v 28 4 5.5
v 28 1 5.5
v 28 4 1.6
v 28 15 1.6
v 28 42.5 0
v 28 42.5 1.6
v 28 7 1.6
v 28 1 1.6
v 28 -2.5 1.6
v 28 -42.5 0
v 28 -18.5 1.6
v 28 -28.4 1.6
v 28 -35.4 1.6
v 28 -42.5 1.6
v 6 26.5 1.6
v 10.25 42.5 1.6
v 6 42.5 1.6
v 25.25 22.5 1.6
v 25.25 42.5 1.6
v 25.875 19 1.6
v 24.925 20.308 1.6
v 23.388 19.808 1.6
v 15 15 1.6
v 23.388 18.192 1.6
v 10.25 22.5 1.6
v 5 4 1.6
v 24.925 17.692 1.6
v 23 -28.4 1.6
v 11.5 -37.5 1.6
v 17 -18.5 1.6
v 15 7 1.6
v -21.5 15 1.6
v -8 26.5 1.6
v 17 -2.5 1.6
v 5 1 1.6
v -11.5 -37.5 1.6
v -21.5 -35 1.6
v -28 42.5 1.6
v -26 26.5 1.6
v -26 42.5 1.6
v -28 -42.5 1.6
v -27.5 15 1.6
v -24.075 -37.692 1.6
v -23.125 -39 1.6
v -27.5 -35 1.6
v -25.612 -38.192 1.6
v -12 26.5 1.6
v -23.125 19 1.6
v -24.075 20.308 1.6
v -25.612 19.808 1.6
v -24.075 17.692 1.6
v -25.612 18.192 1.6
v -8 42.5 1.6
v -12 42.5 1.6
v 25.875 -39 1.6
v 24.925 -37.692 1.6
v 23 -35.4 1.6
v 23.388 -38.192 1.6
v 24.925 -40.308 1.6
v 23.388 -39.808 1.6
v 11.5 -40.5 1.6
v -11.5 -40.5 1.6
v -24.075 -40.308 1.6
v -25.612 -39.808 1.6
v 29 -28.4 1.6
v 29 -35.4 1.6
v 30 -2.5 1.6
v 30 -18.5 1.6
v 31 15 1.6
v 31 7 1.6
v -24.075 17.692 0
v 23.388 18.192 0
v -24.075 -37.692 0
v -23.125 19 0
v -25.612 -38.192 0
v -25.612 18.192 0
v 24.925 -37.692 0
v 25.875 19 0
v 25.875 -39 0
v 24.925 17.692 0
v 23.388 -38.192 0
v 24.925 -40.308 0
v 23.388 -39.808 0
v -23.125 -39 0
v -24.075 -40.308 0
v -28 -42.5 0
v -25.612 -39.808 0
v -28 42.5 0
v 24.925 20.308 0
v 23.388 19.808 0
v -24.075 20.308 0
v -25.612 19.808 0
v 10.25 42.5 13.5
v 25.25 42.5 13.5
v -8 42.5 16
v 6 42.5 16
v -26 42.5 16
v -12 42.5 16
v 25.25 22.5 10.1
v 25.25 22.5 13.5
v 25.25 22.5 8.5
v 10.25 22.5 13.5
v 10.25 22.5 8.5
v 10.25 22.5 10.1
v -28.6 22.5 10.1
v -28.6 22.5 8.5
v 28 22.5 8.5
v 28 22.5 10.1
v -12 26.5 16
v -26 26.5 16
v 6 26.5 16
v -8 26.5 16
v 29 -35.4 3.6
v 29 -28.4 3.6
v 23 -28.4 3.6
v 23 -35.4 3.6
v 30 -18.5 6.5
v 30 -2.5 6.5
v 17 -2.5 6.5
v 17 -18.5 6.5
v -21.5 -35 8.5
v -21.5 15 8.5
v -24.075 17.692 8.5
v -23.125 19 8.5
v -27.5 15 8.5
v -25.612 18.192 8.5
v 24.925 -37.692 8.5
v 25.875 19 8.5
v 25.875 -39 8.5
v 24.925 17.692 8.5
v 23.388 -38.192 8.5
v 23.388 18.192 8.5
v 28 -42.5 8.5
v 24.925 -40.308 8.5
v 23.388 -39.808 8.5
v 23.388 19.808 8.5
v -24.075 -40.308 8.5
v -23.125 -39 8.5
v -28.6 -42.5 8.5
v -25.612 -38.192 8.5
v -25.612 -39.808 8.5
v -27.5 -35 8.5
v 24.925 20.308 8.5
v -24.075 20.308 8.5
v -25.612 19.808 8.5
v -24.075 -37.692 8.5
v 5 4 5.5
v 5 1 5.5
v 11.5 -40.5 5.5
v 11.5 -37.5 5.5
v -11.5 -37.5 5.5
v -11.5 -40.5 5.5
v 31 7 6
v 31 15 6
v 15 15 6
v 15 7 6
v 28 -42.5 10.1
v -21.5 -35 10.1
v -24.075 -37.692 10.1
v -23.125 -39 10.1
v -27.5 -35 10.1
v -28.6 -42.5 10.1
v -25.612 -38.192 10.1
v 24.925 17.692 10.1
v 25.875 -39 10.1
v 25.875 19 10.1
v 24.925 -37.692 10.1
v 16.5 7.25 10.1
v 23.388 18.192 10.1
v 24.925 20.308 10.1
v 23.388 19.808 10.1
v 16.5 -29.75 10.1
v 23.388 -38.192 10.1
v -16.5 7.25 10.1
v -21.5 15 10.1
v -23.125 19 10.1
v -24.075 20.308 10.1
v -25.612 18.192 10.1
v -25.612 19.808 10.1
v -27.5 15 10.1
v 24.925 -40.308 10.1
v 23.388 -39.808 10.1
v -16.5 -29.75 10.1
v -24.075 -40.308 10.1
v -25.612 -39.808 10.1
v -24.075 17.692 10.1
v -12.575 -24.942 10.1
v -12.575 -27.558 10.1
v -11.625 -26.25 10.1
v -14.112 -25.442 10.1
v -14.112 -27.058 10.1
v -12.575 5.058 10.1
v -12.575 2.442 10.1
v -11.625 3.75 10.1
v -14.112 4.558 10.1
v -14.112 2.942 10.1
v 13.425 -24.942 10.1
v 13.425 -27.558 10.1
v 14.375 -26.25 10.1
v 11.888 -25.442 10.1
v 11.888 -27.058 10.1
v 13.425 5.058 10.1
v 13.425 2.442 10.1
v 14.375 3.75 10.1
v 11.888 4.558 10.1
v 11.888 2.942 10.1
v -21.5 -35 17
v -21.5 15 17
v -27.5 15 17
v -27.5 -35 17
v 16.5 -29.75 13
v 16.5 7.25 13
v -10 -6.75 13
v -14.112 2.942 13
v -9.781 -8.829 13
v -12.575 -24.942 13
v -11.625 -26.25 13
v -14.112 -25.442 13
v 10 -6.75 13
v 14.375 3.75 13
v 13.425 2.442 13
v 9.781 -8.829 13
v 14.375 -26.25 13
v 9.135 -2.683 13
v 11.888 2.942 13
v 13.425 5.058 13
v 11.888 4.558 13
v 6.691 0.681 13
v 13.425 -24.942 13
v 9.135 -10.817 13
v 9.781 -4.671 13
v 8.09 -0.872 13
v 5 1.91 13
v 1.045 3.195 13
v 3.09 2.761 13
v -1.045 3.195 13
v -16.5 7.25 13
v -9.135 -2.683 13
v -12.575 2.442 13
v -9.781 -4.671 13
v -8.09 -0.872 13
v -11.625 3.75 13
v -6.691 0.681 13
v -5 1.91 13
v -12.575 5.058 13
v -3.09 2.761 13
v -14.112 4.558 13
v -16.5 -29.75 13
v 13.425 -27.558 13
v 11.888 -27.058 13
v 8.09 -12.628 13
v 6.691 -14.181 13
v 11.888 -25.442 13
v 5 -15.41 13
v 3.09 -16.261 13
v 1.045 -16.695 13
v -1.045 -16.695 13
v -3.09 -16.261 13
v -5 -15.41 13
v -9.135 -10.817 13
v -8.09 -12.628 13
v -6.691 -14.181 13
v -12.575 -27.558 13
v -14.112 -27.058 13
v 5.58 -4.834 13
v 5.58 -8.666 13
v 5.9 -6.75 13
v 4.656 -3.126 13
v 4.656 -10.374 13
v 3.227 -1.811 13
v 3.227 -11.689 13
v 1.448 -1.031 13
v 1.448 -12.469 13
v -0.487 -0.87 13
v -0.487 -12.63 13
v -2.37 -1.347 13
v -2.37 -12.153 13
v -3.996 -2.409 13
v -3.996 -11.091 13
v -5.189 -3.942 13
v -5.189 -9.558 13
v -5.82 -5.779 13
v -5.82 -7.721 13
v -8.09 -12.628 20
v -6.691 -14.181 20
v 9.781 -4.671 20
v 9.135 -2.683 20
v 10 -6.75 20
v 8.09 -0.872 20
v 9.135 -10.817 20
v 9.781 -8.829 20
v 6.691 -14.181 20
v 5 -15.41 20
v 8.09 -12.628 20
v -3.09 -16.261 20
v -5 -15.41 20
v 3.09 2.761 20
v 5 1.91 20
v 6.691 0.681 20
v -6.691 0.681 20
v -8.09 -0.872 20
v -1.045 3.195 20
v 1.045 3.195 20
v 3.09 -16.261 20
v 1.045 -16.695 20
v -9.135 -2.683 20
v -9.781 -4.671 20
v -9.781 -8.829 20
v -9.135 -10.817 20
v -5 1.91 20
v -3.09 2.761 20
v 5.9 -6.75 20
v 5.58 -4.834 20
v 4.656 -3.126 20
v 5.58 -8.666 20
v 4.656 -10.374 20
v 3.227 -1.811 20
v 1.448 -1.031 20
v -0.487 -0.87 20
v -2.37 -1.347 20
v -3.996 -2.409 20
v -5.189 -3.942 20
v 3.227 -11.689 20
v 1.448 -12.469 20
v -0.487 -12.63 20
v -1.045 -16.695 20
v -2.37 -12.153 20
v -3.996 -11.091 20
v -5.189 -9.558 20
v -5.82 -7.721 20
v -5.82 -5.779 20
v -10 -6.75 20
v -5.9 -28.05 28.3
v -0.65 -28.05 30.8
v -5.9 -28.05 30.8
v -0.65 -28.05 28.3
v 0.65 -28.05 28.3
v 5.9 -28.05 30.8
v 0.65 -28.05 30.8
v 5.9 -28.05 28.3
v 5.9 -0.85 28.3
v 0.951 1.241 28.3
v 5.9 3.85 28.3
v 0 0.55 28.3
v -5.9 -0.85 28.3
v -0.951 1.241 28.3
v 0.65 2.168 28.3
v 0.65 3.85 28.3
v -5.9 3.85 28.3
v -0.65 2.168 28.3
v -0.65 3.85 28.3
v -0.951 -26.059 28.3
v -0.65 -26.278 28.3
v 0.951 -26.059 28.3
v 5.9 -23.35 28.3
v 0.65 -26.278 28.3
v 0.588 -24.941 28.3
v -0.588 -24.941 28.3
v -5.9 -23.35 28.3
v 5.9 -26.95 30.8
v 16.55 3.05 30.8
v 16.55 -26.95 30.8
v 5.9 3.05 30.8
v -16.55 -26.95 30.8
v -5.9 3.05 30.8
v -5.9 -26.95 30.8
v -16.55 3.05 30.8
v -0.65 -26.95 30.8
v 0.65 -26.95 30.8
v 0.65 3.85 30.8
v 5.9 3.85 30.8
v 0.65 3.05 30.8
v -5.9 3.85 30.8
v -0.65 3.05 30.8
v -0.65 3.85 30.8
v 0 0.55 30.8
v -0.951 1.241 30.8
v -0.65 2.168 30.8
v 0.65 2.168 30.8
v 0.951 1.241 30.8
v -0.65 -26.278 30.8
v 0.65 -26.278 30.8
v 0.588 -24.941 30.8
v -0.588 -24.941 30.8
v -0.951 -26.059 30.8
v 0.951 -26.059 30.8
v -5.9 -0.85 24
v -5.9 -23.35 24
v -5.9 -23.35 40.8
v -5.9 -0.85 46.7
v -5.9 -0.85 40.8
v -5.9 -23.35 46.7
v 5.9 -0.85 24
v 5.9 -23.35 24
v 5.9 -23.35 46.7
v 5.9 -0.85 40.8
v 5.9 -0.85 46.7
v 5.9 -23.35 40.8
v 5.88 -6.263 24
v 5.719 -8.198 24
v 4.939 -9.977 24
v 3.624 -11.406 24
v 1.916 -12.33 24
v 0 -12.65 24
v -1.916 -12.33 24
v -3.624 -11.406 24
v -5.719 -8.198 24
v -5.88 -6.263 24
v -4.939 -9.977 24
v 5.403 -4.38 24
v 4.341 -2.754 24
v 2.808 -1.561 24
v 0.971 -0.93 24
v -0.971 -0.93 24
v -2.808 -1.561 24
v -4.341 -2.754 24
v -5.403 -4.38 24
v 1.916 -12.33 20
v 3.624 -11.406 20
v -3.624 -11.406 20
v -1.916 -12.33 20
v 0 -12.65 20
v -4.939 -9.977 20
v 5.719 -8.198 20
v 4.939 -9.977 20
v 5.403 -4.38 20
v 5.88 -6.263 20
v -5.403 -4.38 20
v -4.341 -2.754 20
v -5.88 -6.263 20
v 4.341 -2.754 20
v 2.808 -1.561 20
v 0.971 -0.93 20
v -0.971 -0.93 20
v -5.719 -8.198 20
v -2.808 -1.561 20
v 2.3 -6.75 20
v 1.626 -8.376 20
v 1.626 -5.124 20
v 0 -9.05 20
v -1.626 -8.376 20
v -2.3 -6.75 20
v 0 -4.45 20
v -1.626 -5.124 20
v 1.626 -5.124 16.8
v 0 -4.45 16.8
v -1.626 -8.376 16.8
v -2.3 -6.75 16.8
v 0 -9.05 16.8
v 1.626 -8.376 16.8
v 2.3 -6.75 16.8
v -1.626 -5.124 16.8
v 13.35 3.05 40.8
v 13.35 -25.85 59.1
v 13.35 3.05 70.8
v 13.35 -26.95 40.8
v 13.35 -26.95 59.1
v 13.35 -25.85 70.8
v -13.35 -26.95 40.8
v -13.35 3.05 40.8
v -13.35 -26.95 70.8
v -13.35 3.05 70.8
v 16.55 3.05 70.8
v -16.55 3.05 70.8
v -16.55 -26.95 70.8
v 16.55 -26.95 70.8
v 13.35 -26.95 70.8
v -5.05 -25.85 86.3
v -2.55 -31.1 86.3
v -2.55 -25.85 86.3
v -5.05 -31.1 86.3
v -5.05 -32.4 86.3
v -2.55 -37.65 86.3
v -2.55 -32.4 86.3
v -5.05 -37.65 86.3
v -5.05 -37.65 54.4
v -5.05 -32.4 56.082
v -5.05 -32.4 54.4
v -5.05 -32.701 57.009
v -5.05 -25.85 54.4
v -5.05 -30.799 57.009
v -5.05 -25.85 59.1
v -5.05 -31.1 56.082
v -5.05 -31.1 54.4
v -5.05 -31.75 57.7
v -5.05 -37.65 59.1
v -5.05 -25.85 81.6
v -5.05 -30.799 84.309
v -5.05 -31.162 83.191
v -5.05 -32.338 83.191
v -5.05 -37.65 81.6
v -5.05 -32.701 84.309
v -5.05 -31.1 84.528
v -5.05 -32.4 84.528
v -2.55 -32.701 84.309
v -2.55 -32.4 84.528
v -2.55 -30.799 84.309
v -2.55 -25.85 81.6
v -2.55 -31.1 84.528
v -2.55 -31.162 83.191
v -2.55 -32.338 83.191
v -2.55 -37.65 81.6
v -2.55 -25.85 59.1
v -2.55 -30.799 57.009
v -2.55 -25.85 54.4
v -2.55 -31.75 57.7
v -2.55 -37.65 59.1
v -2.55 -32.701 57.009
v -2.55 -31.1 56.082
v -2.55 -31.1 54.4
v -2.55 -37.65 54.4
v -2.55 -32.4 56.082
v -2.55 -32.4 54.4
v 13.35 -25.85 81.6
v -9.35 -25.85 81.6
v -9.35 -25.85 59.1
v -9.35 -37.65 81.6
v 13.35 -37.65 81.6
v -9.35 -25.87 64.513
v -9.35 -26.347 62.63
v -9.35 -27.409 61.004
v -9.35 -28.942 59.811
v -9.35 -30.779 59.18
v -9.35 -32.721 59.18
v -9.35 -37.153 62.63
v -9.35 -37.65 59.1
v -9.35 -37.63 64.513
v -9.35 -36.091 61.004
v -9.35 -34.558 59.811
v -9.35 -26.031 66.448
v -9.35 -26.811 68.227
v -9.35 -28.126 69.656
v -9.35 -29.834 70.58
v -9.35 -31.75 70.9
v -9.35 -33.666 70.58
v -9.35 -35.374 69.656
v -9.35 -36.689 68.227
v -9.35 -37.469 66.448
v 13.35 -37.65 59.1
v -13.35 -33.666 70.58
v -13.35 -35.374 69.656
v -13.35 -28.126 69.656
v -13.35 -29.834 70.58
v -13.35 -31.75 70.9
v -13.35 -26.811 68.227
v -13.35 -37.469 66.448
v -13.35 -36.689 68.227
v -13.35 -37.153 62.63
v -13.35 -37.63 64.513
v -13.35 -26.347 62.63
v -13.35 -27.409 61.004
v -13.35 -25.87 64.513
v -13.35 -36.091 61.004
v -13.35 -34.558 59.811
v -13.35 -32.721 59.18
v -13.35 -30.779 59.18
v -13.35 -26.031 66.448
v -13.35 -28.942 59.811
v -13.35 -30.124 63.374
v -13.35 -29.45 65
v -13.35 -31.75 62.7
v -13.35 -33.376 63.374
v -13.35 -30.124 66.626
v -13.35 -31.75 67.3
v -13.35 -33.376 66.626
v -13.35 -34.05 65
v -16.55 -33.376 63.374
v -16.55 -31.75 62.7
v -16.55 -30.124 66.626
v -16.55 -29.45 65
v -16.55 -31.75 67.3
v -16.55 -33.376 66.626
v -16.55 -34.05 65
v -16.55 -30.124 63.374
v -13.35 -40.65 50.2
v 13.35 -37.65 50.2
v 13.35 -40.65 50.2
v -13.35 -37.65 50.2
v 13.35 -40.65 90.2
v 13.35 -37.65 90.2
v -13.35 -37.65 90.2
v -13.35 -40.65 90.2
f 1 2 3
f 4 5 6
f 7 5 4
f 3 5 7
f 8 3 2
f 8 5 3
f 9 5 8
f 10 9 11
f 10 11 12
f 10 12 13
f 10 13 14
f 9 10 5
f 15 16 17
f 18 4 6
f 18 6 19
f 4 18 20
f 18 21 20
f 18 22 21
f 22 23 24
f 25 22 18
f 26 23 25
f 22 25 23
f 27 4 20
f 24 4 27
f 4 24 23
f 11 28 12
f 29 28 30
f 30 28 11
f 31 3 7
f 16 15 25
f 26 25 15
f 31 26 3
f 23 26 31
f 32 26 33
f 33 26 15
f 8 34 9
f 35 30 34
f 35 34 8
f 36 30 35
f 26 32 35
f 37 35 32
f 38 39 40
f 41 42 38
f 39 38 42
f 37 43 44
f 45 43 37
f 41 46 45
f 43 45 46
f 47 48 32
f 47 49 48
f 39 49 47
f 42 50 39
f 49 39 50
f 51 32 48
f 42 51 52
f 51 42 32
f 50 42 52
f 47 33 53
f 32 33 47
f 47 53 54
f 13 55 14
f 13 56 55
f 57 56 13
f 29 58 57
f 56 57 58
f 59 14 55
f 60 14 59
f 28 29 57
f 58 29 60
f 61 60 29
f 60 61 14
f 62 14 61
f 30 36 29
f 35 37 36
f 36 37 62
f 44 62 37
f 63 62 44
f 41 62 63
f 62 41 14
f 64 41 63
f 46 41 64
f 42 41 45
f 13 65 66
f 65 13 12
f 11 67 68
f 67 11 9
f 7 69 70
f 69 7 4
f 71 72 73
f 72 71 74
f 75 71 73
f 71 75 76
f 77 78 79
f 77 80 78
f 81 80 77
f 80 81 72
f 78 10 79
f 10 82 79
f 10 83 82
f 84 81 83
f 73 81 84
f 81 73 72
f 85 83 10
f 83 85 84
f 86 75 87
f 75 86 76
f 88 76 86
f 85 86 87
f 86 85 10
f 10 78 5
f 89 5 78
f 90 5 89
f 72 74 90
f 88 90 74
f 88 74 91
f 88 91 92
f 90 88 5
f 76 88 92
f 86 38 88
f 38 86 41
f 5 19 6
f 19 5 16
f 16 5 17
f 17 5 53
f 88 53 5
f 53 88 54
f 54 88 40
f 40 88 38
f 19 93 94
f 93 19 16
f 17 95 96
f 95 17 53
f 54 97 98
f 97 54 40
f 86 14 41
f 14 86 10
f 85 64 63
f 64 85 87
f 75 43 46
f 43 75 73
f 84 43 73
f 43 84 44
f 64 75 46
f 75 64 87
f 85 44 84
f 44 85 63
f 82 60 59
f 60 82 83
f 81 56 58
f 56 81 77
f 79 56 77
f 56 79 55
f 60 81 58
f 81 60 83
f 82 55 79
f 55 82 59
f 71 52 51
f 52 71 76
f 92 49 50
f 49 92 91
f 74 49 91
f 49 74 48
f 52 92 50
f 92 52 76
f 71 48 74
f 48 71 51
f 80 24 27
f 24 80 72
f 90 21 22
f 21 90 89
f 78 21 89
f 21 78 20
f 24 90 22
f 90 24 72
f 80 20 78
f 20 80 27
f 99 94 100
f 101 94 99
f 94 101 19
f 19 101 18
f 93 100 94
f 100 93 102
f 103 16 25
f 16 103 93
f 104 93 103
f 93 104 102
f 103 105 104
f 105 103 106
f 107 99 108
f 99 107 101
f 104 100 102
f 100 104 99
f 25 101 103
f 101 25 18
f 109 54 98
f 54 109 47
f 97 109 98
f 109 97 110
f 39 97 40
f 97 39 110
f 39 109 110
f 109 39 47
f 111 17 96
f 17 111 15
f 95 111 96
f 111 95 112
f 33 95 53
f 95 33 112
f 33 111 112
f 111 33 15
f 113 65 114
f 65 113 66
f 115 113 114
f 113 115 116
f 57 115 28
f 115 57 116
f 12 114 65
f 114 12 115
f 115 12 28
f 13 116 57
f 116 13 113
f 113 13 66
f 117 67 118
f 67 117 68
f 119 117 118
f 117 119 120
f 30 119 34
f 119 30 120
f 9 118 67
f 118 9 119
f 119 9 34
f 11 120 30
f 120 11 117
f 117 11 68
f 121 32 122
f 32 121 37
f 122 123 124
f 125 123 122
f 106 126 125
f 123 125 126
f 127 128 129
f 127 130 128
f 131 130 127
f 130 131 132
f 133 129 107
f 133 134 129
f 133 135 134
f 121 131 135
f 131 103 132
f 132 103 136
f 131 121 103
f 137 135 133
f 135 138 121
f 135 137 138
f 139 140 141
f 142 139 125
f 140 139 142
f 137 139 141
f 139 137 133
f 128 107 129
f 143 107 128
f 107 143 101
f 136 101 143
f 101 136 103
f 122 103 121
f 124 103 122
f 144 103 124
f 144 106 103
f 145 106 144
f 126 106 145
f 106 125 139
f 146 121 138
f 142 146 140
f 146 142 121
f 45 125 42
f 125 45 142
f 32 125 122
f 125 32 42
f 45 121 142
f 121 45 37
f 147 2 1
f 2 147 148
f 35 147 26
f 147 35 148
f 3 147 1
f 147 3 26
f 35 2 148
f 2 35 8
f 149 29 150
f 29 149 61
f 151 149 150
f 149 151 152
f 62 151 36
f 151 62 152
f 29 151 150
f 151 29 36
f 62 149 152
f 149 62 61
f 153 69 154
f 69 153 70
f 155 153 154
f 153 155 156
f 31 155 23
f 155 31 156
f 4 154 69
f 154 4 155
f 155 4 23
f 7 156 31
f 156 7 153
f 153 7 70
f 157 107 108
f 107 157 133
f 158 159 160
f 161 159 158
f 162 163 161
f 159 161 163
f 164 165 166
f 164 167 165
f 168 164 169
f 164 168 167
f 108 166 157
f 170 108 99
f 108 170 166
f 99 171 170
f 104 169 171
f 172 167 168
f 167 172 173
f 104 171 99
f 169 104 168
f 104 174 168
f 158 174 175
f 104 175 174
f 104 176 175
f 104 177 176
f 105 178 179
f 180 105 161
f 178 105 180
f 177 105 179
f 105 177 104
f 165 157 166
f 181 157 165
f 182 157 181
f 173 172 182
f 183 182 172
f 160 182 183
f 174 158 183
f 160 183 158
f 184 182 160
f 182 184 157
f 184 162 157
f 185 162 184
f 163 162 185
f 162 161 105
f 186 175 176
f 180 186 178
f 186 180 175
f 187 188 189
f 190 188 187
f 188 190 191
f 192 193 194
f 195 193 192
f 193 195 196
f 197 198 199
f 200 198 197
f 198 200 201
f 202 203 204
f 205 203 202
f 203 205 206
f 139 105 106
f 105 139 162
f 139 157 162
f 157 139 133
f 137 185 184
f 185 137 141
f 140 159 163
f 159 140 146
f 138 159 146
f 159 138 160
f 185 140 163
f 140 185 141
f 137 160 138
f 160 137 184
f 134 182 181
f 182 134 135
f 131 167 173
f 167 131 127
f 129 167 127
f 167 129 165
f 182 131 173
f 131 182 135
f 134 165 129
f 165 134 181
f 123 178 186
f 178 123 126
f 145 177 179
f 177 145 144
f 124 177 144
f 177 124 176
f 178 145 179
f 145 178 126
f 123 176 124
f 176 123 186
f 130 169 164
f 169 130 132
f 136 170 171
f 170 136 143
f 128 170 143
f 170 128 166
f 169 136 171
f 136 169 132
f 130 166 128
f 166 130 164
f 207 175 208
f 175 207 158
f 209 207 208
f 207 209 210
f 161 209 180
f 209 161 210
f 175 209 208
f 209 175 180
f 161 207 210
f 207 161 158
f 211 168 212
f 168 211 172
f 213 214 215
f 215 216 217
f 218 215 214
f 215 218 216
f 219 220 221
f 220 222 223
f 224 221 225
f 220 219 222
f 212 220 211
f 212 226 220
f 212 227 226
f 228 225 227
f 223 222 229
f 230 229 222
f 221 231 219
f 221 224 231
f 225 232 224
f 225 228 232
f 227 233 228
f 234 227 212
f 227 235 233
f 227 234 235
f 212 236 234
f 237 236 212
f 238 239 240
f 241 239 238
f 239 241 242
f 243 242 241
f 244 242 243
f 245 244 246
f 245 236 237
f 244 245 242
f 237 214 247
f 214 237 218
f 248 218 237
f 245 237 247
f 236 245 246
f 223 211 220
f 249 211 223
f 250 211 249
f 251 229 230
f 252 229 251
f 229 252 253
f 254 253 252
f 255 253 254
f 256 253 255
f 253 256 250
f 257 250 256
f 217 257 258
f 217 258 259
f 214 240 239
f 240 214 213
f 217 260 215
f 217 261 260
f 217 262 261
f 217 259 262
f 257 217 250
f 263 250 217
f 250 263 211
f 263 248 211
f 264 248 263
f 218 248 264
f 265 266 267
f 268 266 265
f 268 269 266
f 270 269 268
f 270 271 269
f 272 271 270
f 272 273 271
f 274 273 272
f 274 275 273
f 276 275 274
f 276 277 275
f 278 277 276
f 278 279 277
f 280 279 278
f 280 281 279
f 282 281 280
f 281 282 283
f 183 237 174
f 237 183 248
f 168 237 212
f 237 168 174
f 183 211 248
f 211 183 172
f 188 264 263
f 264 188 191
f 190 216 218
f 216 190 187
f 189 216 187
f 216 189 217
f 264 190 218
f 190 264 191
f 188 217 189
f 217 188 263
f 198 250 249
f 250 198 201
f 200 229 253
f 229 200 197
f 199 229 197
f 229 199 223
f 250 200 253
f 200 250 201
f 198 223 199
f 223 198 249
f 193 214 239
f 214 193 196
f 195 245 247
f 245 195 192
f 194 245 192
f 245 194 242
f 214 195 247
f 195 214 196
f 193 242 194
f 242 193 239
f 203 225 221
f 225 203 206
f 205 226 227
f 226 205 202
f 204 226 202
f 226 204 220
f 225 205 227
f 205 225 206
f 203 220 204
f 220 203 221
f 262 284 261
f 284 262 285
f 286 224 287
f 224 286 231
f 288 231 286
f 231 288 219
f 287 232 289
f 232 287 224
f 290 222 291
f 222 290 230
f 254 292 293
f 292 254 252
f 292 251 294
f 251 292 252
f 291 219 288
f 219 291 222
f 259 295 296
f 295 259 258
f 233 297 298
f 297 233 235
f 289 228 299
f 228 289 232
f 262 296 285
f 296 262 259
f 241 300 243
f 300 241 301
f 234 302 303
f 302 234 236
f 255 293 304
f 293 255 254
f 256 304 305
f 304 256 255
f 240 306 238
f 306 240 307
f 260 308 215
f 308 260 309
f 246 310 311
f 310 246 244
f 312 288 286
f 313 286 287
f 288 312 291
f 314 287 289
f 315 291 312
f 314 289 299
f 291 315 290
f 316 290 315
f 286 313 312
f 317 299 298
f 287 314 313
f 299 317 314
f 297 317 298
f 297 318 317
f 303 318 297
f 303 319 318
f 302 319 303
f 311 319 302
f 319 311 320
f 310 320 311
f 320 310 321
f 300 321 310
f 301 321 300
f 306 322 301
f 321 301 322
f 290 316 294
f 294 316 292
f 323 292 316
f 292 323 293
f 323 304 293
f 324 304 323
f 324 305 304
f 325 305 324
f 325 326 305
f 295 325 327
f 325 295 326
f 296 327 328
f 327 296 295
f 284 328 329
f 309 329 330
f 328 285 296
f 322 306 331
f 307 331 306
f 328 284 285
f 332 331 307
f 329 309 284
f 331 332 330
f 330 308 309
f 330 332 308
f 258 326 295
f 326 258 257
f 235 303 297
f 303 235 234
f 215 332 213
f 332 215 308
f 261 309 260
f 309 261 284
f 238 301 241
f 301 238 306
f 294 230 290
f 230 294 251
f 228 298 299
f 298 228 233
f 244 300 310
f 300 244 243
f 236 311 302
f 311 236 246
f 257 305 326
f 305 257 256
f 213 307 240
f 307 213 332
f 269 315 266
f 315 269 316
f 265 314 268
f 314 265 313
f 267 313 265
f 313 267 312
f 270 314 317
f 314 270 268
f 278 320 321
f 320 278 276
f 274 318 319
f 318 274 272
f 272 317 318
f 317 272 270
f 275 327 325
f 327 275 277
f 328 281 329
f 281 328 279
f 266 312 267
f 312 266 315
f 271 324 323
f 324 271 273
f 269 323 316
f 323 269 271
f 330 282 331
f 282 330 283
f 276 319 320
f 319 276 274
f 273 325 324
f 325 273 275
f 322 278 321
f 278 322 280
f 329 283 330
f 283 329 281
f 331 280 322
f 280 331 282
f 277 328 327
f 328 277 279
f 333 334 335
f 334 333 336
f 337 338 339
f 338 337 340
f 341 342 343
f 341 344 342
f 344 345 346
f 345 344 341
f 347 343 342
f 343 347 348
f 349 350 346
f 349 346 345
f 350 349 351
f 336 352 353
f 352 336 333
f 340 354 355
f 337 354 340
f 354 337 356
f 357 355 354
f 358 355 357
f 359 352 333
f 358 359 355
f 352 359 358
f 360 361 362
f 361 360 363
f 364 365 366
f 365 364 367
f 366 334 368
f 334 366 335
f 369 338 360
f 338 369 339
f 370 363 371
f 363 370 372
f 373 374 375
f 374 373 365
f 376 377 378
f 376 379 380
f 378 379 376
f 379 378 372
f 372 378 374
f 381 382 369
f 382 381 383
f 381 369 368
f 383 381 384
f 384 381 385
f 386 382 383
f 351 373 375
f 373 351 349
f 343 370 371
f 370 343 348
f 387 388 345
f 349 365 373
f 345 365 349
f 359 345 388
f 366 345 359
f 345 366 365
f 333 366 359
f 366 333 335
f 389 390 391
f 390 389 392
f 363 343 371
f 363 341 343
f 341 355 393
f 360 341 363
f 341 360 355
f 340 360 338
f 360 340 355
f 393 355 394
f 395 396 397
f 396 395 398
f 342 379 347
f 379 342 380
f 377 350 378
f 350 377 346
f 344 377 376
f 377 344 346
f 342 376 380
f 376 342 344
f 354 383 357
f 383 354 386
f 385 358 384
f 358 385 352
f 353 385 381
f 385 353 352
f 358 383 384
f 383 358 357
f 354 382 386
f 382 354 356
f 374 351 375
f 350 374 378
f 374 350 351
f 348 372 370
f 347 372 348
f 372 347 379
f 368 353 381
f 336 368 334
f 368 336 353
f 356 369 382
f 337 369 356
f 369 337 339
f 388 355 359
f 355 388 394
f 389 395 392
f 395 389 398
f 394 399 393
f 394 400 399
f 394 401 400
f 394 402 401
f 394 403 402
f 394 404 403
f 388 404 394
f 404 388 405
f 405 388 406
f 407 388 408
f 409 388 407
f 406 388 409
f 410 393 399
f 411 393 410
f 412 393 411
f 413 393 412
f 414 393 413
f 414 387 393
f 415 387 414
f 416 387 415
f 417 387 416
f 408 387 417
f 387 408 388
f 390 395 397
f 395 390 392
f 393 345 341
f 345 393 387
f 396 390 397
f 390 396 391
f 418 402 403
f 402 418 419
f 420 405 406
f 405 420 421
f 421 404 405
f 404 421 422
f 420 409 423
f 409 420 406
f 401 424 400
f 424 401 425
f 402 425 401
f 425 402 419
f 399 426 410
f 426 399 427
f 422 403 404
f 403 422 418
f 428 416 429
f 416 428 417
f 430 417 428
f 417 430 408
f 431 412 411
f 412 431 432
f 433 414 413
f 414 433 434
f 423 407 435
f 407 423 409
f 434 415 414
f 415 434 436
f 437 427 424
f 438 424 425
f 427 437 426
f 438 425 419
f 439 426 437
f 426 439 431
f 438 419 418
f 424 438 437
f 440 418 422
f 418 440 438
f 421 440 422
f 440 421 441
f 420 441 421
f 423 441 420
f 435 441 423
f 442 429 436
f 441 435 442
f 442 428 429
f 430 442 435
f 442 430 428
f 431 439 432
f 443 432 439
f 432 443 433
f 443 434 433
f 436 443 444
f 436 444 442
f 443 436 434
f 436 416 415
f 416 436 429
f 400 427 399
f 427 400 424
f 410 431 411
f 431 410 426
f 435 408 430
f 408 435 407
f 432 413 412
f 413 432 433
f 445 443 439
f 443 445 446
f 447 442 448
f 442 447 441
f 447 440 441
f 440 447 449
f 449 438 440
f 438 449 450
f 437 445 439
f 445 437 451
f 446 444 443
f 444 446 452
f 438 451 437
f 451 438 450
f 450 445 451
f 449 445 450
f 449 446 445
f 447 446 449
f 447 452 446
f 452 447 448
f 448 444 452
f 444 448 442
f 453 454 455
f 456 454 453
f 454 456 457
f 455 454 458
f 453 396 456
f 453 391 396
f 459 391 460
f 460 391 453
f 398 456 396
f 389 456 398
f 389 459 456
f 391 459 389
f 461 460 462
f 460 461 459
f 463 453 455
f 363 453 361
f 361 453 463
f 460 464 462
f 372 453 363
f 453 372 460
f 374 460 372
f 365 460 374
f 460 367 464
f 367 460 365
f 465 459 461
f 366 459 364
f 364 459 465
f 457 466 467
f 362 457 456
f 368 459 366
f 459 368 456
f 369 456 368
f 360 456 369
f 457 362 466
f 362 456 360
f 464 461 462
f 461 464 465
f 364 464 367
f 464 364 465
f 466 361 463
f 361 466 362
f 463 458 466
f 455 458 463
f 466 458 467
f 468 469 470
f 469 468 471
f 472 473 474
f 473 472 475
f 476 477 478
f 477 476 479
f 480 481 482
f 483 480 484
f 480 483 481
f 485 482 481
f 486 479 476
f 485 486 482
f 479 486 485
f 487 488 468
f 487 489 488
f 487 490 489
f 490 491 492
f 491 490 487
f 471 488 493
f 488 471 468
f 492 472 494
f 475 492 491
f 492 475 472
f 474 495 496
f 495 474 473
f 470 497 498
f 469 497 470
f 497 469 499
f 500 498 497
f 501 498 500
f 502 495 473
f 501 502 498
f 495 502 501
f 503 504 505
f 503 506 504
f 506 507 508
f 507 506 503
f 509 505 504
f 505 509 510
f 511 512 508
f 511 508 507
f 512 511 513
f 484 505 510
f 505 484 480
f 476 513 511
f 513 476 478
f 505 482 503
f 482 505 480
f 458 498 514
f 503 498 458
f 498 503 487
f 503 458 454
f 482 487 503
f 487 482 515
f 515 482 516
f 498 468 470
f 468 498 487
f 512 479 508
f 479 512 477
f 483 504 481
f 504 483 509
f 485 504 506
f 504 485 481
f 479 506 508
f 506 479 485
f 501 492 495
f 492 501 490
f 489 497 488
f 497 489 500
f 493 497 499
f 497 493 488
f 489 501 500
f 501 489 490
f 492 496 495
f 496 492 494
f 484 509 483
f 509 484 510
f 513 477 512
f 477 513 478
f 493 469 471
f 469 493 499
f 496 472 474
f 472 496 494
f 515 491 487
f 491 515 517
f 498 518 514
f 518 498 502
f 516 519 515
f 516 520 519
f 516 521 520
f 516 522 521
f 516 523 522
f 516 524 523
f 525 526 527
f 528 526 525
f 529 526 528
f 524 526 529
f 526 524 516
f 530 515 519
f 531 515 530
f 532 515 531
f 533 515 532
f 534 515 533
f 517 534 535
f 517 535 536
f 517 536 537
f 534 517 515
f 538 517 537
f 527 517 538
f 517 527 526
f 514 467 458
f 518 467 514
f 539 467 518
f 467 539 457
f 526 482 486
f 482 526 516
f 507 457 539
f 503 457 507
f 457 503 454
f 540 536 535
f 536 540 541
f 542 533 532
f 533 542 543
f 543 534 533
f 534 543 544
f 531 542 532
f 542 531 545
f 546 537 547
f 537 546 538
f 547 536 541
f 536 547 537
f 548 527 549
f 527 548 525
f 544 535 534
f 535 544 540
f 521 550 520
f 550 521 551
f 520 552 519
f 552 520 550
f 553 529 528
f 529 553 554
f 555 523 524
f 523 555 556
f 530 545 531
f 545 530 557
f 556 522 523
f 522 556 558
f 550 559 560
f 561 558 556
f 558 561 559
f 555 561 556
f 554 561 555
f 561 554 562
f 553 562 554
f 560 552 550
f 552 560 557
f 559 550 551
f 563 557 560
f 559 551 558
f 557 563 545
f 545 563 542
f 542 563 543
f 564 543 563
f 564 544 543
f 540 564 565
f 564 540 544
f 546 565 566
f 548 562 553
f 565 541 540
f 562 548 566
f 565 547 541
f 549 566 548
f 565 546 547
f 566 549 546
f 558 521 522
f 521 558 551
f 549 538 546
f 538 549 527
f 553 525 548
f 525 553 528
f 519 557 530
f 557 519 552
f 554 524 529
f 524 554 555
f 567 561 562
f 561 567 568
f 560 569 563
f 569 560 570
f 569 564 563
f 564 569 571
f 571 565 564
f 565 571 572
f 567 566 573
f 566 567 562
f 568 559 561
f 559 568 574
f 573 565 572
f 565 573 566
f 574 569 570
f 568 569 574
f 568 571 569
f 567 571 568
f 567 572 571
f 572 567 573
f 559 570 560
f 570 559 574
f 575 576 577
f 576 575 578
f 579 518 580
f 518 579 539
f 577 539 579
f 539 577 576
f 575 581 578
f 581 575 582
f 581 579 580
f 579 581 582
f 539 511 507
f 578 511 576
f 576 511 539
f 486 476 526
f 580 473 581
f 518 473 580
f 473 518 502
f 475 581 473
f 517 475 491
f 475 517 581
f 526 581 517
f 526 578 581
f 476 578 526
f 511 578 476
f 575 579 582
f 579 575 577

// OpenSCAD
// file: servo_sg90.scad
servo_sg90();

module servo_sg90()
{
    width = 22.5;
    length = 11.8;
    height = 22.7;
    
    mounting_width = width + (2 * 4.7);
    mounting_length = length;
    mounting_height = 2.5;
    mounting_width_offset = -4.7;
    mounting_height_offset = 18.4 - mounting_height;
    
    mounting_hole_diameter = 2;
    mounting_hole_width_offset = 2.3;
    mounting_hole_length_offset = 5.9;
    
    mounting_notch_width = mounting_hole_width_offset;
    mounting_notch_length = 1.3;
    mounting_notch_width_offset = mounting_notch_width / 2;
    
    mount_point_height = 4;
    mount_point_diameter = 11.8;
    mount_point_width_offset = 5.9;
    mount_point_length_offset = length / 2;
    mount_point_height_offset = height;
    
    gear_height = 3.2;
    gear_diameter = 4.6;
    gear_width_offset = mount_point_width_offset;
    gear_length_offset = mount_point_length_offset;
    gear_height_offset = mount_point_height_offset + mount_point_height;
    
    rotate([0, 180, 0])
    translate([-(gear_width_offset), -(gear_length_offset), -(height + mount_point_height)])
    union()
    {
        color("blue", 1.0)
        cube([width, length, height], false);
        
        color("blue", 1.0)
        translate([mounting_width_offset, 0, mounting_height_offset])
        difference()
        {
            cube([mounting_width, mounting_length, mounting_height], false);
            
            translate([mounting_hole_width_offset, mounting_hole_length_offset, 0])
            cylinder(height, d = mounting_hole_diameter);
            
            translate([mounting_width - mounting_hole_width_offset, mounting_hole_length_offset, 0])
            cylinder(height, d = mounting_hole_diameter);
            
            translate([mounting_notch_width_offset, mounting_hole_length_offset, 0])
            cube([mounting_notch_width, mounting_notch_length, height], true);

            translate([mounting_width - mounting_notch_width_offset, mounting_hole_length_offset, 0])
            cube([mounting_notch_width, mounting_notch_length, height], true);
        }
        
        color("blue", 1.0)
        translate([mount_point_width_offset, mount_point_length_offset, mount_point_height_offset])
        cylinder(mount_point_height, d = mount_point_diameter);
        
        color("white", 1.0)
        translate([gear_width_offset, gear_length_offset, gear_height_offset])
        cylinder(gear_height, d = gear_diameter);
    }
}
// file: raspberry_pi_pan_tilt.scad
use <servo_sg90.scad>

raspberry_pi_pan_tilt_base__base_height = 3;
raspberry_pi_pan_tilt_base__bottom_servo_mount_height = 7;

raspberry_pi_pan_tilt(6.5, 0, 0);

module raspberry_pi_pan_tilt(bottom_mount_offset, pan_angle, tilt_angle)
{
    bottom_servo_height_offset = 10;
    
    bottom_servo_housing_width = 26.7;
    bottom_servo_housing_length = 30;
    bottom_servo_housing_height = 10;
    bottom_servo_housing_mount_height = 40;
    bottom_servo_housing_length_offset = -5.2;
    bottom_servo_housing_height_offset = bottom_servo_height_offset + 10.8;
    
    top_servo_width_offset = -(26.7 / 2);//-15;
    top_servo_length_offset = -25;
    top_servo_height_offset = 55;

    top_servo_housing_width = 40;
    top_servo_housing_length = 3;
    top_servo_housing_height = 26.7;
    top_servo_housing_width_offset = -5.2;
    top_servo_housing_length_offset = -5.9 - (top_servo_housing_length / 2);
    top_servo_housing_height_offset = 0;
    
    raspberry_pi_pan_tilt_base(bottom_mount_offset);

    rotate([0, 0, pan_angle])
    union()
    {
        rotate([0, 0, 90])
        translate([0, 0, bottom_servo_height_offset])
        servo_sg90();
        
        translate([0, bottom_servo_housing_length_offset, bottom_servo_housing_height_offset])
        raspberry_pi_pan_tilt_bottom_servo_housing(bottom_servo_housing_width, bottom_servo_housing_length, bottom_servo_housing_height, bottom_servo_housing_mount_height);

        rotate([90, 90, 90])
        translate([-top_servo_height_offset, top_servo_length_offset, top_servo_width_offset])
        rotate([0, 0, tilt_angle])
        union()
        {
            servo_sg90();
            
            translate([top_servo_housing_width_offset, top_servo_housing_length_offset, top_servo_housing_height_offset])
            raspberry_pi_pan_tilt_top_servo_housing(top_servo_housing_width, top_servo_housing_length, top_servo_housing_height);
        }
    }
}

module raspberry_pi_pan_tilt_base(bottom_mount_offset)
{
    base_width = 33;
    base_length = 37;
    base_height = 3;
    
    mounting_hole_width = 26;
    mounting_hole_length = 30;
    
    mounting_hole_diameter = 2.75;
    mounting_hole_width_offset = (base_width - mounting_hole_width) / 2;
    mounting_hole_length_offset = (base_length - mounting_hole_length) / 2;
    
    bottom_servo_mount_height = 7;
    bottom_servo_mount_outer_diameter = 20;
    bottom_servo_mount_inner_diameter = 11.8;
    
    bottom_servo_mount_width_offset = base_width / 2;
    bottom_servo_mount_length_offset = bottom_mount_offset + (base_width / 2);
    bottom_servo_mount_height_offset = base_height;

    translate([-(bottom_servo_mount_width_offset), -(bottom_servo_mount_length_offset), 0])
    color("black", 1.0)
    union()
    {
        difference()
        {
            cube([base_width, base_length, base_height], false);
            
            translate([mounting_hole_width_offset, mounting_hole_length_offset, 0])
            cylinder(base_height * 2, d = mounting_hole_diameter, true);

            translate([base_width - mounting_hole_width_offset, mounting_hole_length_offset, 0])
            cylinder(base_height * 2, d = mounting_hole_diameter, true);

            translate([mounting_hole_width_offset, base_length - mounting_hole_length_offset, 0])
            cylinder(base_height * 2, d = mounting_hole_diameter, true);

            translate([base_width - mounting_hole_width_offset, base_length - mounting_hole_length_offset, 0])
            cylinder(base_height * 2, d = mounting_hole_diameter, true);
        }
        
        translate([bottom_servo_mount_width_offset, bottom_servo_mount_length_offset, bottom_servo_mount_height_offset])
        difference()
        {
            cylinder(bottom_servo_mount_height, d = bottom_servo_mount_outer_diameter);
            cylinder(bottom_servo_mount_height, d = bottom_servo_mount_inner_diameter);
        }
    }
}

module raspberry_pi_pan_tilt_bottom_servo_housing(housing_width, housing_length, housing_height, mount_height)
{
    thickness = 3.2;
    
    color("black", 1.0)
    translate([-(housing_width / 2), -(housing_length / 2), 0])
    union()
    {
        cube([housing_width, housing_length, housing_height], false);
        
        translate([-thickness, 0, 0])
        cube([thickness, housing_length, mount_height]);

        translate([housing_width, 0, 0])
        cube([thickness, housing_length, mount_height]);
    }
}

module raspberry_pi_pan_tilt_top_servo_housing(housing_width, housing_length, housing_height)
{
    color("black", 1.0)
    translate([-(housing_width / 2), -(housing_length / 2), 0])
    cube([housing_width, housing_length, housing_height], false);
}
// file: maker_focus_pan_tilt_hat.scad
maker_focus_pan_tilt_hat();

module maker_focus_pan_tilt_hat()
{
    board_width = 56.6;
    board_length = 65;
    board_height = 1.6;
    
    mounting_pad_diameter = 6;
    mounting_hole_diameter = 2.75;
    mounting_hole_width_offset_1 = 4.1;
    mounting_hole_width_offset_2 = 3.5;
    mounting_hole_length_offset_1 = 3.5;
    mounting_hole_length_offset_2 = mounting_hole_length_offset_1 + 58; 
    
    header_width = 6;
    header_length = 50;
    header_height = 8.5 - board_height;
    header_length_offset = mounting_hole_length_offset_1 + 29 - (header_length / 2);
    header_width_offset = mounting_hole_width_offset_1 - (header_width / 2);;

    translate([-(board_width / 2), -(board_length / 2), 0])
    union()
    {
        difference()
        {
            union()
            {
                difference()
                {
                    color("blue", 1.0)
                    cube([board_width, board_length, board_height]);

                    translate([mounting_hole_width_offset_1, mounting_hole_length_offset_1, 0])
                    cylinder(board_height * 2, d = mounting_pad_diameter, true);

                    translate([board_width - mounting_hole_width_offset_2, mounting_hole_length_offset_1, 0])
                    cylinder(board_height * 2, d = mounting_pad_diameter, true);

                    translate([mounting_hole_width_offset_1, mounting_hole_length_offset_2, 0])
                    cylinder(board_height * 2, d = mounting_pad_diameter, true);

                    translate([board_width - mounting_hole_width_offset_2, mounting_hole_length_offset_2, 0])
                    cylinder(board_height * 2, d = mounting_pad_diameter, true);
                }
                color("gold", 1.0)
                {
                    translate([mounting_hole_width_offset_1, mounting_hole_length_offset_1, 0])
                    cylinder(board_height, d = mounting_pad_diameter, true);

                    translate([board_width - mounting_hole_width_offset_2, mounting_hole_length_offset_1, 0])
                    cylinder(board_height, d = mounting_pad_diameter, true);

                    translate([mounting_hole_width_offset_1, mounting_hole_length_offset_2, 0])
                    cylinder(board_height, d = mounting_pad_diameter, true);

                    translate([board_width - mounting_hole_width_offset_2, mounting_hole_length_offset_2, 0])
                    cylinder(board_height, d = mounting_pad_diameter, true);
                }
            }
            translate([mounting_hole_width_offset_1, mounting_hole_length_offset_1, 0])
            cylinder(board_height * 2, d = mounting_hole_diameter, true);

            translate([board_width - mounting_hole_width_offset_2, mounting_hole_length_offset_1, 0])
            cylinder(board_height * 2, d = mounting_hole_diameter, true);

            translate([mounting_hole_width_offset_1, mounting_hole_length_offset_2, 0])
            cylinder(board_height * 2, d = mounting_hole_diameter, true);

            translate([board_width - mounting_hole_width_offset_2, mounting_hole_length_offset_2, 0])
            cylinder(board_height * 2, d = mounting_hole_diameter, true);
        }
        
        color("gold", 1.0)
        translate([header_width_offset, header_length_offset, board_height])
        cube([header_width, header_length, header_height]);
    }
}
// file: raspberry_pi.scad
raspberry_pi(2);

module raspberry_pi(model)
{
    board_width = 56;
    board_length = model==1?65:model==2?85:85;
    board_height = 1.6;
    
    mounting_pad_diameter = 6;
    mounting_hole_diameter = 2.75;
    mounting_hole_width_offset = 3.5;
    mounting_hole_length_offset_1 = 3.5;
    mounting_hole_length_offset_2 = mounting_hole_length_offset_1 + 58; 
    
    usb_height_variation = model==1?7:model==2?16:16;
    usb_width_offset_variation = model==1?31.5:model==2?29:29;
    
    usb_width = 14;
    usb_length = 16;
    usb_height = usb_height_variation - board_height;
    usb_length_offset = board_length - usb_length;
    usb_1_width_offset = board_width - usb_width_offset_variation - (usb_width / 2);
    usb_2_width_offset = board_width - 47 - (usb_width / 2);
    
    eth_width = 15;
    eth_length = 20;
    eth_height = 13.5 - board_height;
    eth_width_offset = board_width - 10.25 - (eth_width / 2);
    eth_length_offset = board_length - eth_length;
    
    usb_power_width = 6;
    usb_power_length = 7;
    usb_power_height = 2;
    usb_power_length_offset = 10.6 - (usb_power_length / 2);
    usb_power_width_overhang = 1;
    usb_power_width_offset = board_width - usb_power_width + usb_power_width_overhang;

    hdmi_width = 13;
    hdmi_length = 16;
    hdmi_height = 6.5 - board_height;
    hdmi_overhang = 2;
    hdmi_length_offset = 32 - (hdmi_length / 2);
    hdmi_width_offset = board_width - hdmi_width + hdmi_overhang;
    
    header_width = 6;
    header_length = 50;
    header_height = 8.5 - board_height;
    header_length_offset = mounting_hole_length_offset_1 + 29 - (header_length / 2);
    header_width_offset = mounting_hole_width_offset - (header_width / 2);;

    camera_width = 23;
    camera_length = 3;
    camera_height = 5.5 - board_height;
    camera_length_offset = 32 + 13 - (camera_length / 2);
    camera_width_offset = board_width - 11.5 - (camera_width / 2);
    
    display_width = 23;
    display_length = 3;
    display_height = 5.5 - board_height;
    display_length_offset = mounting_hole_width_offset - (camera_length / 2);
    display_width_offset = board_width - 28 - (camera_width / 2);
    
    audio_width = 16;
    audio_length = 8;
    audio_height = 6 - board_height;
    audio_overhang = 3;
    audio_length_offset = 53.5 - (audio_length / 2);
    audio_width_offset = board_width - audio_width + audio_overhang;
    
    translate([-(board_width / 2), -(board_length / 2), 0])
    union()
    {
        difference()
        {
            union()
            {
                difference()
                {
                    color("green", 1.0)
                    cube([board_width, board_length, board_height]);

                    translate([mounting_hole_width_offset, mounting_hole_length_offset_1, 0])
                    cylinder(board_height * 2, d = mounting_pad_diameter, true);

                    translate([board_width - mounting_hole_width_offset, mounting_hole_length_offset_1, 0])
                    cylinder(board_height * 2, d = mounting_pad_diameter, true);

                    translate([mounting_hole_width_offset, mounting_hole_length_offset_2, 0])
                    cylinder(board_height * 2, d = mounting_pad_diameter, true);

                    translate([board_width - mounting_hole_width_offset, mounting_hole_length_offset_2, 0])
                    cylinder(board_height * 2, d = mounting_pad_diameter, true);
                }
                color("gold", 1.0)
                {
                    translate([mounting_hole_width_offset, mounting_hole_length_offset_1, 0])
                    cylinder(board_height, d = mounting_pad_diameter, true);

                    translate([board_width - mounting_hole_width_offset, mounting_hole_length_offset_1, 0])
                    cylinder(board_height, d = mounting_pad_diameter, true);

                    translate([mounting_hole_width_offset, mounting_hole_length_offset_2, 0])
                    cylinder(board_height, d = mounting_pad_diameter, true);

                    translate([board_width - mounting_hole_width_offset, mounting_hole_length_offset_2, 0])
                    cylinder(board_height, d = mounting_pad_diameter, true);
                }
            }
            translate([mounting_hole_width_offset, mounting_hole_length_offset_1, 0])
            cylinder(board_height * 2, d = mounting_hole_diameter, true);

            translate([board_width - mounting_hole_width_offset, mounting_hole_length_offset_1, 0])
            cylinder(board_height * 2, d = mounting_hole_diameter, true);

            translate([mounting_hole_width_offset, mounting_hole_length_offset_2, 0])
            cylinder(board_height * 2, d = mounting_hole_diameter, true);

            translate([board_width - mounting_hole_width_offset, mounting_hole_length_offset_2, 0])
            cylinder(board_height * 2, d = mounting_hole_diameter, true);
        }
        
        if(model == 2)
        {
            color("silver", 1.0)
            translate([eth_width_offset, eth_length_offset, board_height])
            cube([eth_width, eth_length, eth_height]);

            color("silver", 1.0)
            translate([usb_2_width_offset, usb_length_offset, board_height])
            cube([usb_width, usb_length, usb_height]);
        }

        color("silver", 1.0)
        translate([usb_1_width_offset, usb_length_offset, board_height])
        cube([usb_width, usb_length, usb_height]);

        color("silver", 1.0)
        translate([usb_power_width_offset, usb_power_length_offset, board_height])
        cube([usb_power_width, usb_power_length, usb_power_height]);

        color("silver", 1.0)
        translate([hdmi_width_offset, hdmi_length_offset, board_height])
        cube([hdmi_width, hdmi_length, hdmi_height]);

        color("gold", 1.0)
        translate([header_width_offset, header_length_offset, board_height])
        cube([header_width, header_length, header_height]);
        
        color("black", 1.0)
        translate([camera_width_offset, camera_length_offset, board_height])
        cube([camera_width, camera_length, camera_height]);
        
        color("black", 1.0)
        translate([display_width_offset, display_length_offset, board_height])
        cube([display_width, display_length, display_height]);

        color("black", 1.0)
        translate([audio_width_offset, audio_length_offset, board_height])
        cube([audio_width, audio_length, audio_height]);
    }
}
// main file
use <raspberry_pi.scad>
use <maker_focus_pan_tilt_hat.scad>
use <raspberry_pi_pan_tilt.scad>

raspberry_pi_assembly(2, 0, 0);

module raspberry_pi_assembly(model, pan, tilt)
{
    hat_mounting_width_offset = -0.3;
    hat_mounting_length_offset = model==1?0:model==2?-10:-10;
    hat_mounting_height_offset = 8.5;
    
    pan_tilt_bottom_mount_offset = 6.5;
    pan_tilt_mounting_width_offset = 0;
    pan_tilt_mounting_length_offset = (pan_tilt_bottom_mount_offset / 2) + (model==1?0:model==2?-10:-10);
    pan_tilt_mounting_height_offset = hat_mounting_height_offset + 1.5;
    
    raspberry_pi(model);

    translate([hat_mounting_width_offset, hat_mounting_length_offset, hat_mounting_height_offset])
    maker_focus_pan_tilt_hat();
    
    translate([pan_tilt_mounting_width_offset, pan_tilt_mounting_length_offset, pan_tilt_mounting_height_offset])
    raspberry_pi_pan_tilt(pan_tilt_bottom_mount_offset, pan, tilt);
}
